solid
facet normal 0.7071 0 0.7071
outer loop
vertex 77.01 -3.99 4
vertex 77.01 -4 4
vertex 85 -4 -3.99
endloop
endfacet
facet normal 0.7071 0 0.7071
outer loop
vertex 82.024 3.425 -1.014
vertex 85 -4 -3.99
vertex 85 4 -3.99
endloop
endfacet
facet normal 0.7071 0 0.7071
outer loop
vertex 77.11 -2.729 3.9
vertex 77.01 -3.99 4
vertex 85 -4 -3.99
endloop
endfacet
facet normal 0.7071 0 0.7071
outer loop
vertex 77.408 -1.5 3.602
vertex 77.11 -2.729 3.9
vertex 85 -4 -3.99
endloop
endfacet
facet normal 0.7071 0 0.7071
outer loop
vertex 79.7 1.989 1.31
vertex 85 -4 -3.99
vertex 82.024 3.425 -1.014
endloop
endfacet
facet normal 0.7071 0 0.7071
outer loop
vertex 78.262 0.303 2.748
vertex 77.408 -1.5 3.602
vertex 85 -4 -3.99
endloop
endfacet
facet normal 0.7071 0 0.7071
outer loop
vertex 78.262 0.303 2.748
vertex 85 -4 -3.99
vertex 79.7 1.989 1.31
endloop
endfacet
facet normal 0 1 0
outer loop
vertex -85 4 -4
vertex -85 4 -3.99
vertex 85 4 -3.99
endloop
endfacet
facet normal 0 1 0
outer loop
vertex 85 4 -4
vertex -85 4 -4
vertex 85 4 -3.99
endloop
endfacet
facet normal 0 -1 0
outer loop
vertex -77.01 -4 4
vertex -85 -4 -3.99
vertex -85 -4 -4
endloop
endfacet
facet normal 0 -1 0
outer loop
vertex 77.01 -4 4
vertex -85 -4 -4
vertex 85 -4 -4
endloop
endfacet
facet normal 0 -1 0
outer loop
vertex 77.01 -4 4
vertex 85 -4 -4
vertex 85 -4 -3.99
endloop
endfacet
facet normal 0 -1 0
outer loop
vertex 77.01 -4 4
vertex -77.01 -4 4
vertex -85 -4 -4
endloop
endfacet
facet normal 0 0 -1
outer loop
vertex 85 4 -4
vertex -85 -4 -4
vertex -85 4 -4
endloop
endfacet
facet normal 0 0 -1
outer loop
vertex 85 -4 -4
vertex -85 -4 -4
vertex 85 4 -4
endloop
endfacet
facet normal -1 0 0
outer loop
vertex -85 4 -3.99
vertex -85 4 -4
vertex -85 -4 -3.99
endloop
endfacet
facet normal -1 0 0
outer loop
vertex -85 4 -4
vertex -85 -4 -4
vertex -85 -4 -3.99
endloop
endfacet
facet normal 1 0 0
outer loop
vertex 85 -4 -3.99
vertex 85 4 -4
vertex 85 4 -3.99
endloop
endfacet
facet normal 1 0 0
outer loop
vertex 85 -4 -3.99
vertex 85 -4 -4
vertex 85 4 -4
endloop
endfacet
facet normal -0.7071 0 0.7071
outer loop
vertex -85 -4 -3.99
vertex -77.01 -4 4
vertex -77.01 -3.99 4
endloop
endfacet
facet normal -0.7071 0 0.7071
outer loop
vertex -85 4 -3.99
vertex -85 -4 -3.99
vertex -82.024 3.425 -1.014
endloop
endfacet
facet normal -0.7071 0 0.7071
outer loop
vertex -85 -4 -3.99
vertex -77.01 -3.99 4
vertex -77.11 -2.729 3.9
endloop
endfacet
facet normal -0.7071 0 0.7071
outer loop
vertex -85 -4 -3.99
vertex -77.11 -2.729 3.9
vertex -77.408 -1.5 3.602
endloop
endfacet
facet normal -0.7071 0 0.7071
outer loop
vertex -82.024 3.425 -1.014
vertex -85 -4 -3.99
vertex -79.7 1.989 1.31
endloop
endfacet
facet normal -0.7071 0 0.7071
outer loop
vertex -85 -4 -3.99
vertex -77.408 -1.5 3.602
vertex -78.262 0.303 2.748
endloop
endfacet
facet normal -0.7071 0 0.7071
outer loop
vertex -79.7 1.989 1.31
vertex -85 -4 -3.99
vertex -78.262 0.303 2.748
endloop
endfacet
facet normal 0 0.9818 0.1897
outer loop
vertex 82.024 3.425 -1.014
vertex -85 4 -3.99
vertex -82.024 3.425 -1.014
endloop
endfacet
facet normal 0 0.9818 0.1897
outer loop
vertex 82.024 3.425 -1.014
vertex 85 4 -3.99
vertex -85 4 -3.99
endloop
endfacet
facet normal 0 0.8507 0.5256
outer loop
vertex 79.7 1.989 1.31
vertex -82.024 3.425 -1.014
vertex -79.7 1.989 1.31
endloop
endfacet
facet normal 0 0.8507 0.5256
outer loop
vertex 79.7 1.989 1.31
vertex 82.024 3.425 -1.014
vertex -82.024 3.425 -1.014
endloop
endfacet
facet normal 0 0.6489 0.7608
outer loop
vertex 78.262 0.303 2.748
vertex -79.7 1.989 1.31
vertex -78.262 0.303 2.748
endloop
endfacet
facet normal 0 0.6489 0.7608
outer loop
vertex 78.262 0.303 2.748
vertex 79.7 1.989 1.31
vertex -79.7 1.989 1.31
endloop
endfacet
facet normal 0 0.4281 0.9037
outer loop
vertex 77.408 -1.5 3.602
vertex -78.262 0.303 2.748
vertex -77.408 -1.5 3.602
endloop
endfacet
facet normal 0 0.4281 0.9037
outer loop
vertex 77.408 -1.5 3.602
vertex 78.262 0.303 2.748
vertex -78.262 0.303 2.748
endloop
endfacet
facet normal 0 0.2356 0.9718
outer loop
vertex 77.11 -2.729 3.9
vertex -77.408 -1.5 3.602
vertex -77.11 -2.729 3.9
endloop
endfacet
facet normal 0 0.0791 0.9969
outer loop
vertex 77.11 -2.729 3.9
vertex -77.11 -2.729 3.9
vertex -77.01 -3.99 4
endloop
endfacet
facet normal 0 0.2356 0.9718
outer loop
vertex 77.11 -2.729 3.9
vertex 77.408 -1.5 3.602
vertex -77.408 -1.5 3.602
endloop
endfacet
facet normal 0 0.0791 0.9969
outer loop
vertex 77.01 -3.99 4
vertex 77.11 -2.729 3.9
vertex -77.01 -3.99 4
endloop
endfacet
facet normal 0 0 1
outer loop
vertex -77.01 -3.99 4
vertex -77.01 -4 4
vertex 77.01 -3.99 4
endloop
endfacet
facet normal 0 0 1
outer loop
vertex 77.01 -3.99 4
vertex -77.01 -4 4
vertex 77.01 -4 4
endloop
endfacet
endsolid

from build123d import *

# Parameters (mm, degrees)
SKETCH002_W     = 170
SKETCH002_H     = 8
PAD002_DEPTH    = 4
CHAMFER001_SIZE = 7.99
FILLET001_R     = 7.99


with BuildPart() as part:
    # Sketch002 → Pad002 (new body, symmetric)
    with BuildSketch(Plane.XZ):
        Rectangle(SKETCH002_W, SKETCH002_H)
    extrude(amount=PAD002_DEPTH, both=True)

    # Chamfer001
    chamfer001_edges = [part.edges().sort_by_distance(p)[0] for p in [
        (85, 0, 4),
        (-85, 0, 4),
    ]]
    chamfer(chamfer001_edges, length=CHAMFER001_SIZE)

    # Fillet001
    fillet001_edges = [part.edges().sort_by_distance(p)[0] for p in [
        (0, 4, 4),
    ]]
    fillet(fillet001_edges, radius=FILLET001_R)


solid = part.part
